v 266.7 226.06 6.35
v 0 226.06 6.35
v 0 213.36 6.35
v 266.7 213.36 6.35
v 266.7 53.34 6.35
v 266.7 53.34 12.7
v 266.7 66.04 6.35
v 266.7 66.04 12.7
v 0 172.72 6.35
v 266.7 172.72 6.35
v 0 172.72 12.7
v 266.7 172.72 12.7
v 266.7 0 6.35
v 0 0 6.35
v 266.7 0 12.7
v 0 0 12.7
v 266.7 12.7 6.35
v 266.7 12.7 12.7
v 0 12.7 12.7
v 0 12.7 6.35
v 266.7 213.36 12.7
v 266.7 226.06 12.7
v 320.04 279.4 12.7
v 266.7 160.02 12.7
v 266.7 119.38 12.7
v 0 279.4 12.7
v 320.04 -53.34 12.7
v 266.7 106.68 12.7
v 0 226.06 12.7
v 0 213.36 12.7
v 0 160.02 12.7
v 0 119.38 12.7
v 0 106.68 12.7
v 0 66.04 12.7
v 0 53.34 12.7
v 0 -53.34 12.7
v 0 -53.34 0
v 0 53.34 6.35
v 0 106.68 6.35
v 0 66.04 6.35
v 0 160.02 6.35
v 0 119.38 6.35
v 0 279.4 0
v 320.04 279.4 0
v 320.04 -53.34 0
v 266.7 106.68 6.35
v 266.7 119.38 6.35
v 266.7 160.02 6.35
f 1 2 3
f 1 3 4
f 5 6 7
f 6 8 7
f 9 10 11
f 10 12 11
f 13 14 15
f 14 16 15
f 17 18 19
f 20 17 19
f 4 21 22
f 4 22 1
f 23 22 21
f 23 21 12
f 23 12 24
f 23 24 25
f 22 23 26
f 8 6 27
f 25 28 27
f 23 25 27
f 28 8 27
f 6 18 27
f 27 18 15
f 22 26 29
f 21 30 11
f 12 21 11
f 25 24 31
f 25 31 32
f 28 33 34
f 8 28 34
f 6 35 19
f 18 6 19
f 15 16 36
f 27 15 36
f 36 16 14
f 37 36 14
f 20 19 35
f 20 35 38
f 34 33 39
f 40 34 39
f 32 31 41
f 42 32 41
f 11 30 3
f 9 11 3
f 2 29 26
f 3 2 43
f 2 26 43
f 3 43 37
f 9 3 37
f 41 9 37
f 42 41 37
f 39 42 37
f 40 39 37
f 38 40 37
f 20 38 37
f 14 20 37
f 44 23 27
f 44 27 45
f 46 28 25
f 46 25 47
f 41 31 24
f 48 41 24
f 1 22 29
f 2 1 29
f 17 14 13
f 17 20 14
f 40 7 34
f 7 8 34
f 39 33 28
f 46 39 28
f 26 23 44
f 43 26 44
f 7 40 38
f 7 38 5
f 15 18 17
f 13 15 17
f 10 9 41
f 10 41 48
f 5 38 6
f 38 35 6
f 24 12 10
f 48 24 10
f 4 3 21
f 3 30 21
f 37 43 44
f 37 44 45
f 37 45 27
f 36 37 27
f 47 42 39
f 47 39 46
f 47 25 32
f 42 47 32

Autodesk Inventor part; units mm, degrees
ref_plane "YZ Plane" through (0, 0, 0) normal (1, 0, 0) x (0, 1, 0)
ref_plane "XZ Plane" through (0, 0, 0) normal (0, 1, 0) x (-1, 0, 0)
ref_plane "XY Plane" through (0, 0, 0) normal (0, 0, 1) x (1, 0, 0)
sketch "Sketch1" plane through (0, 0, 0) normal (0, 0, 1) x (1, 0, 0)
  line L0 (0, 0) -> (279.4, 0)
  line L1 (279.4, 0) -> (279.4, 279.4)
  line L2 (279.4, 279.4) -> (0, 279.4)
  line L3 (0, 279.4) -> (0, 0)
  dimension "d0" = 279.4
  dimension "d1" = 279.4
extrude "Extrusion1" add sketch "Sketch1" along normal blind 12.7
sketch "Sketch2" plane through (0, 0, 12.7) normal (0, 0, 1) x (1, 0, 0)
  line L0 (279.4, 0) -> (279.4, 279.4) projected
  line L1 (0, 0) -> (279.4, 0)
  line L2 (279.4, 0) -> (279.4, 12.7)
  line L3 (279.4, 12.7) -> (0, 12.7)
  line L4 (0, 12.7) -> (0, 0)
  line L5 (0, 279.4) -> (0, 0) projected
  line L6 (0, 53.34) -> (279.4, 53.34)
  line L7 (279.4, 53.34) -> (279.4, 66.04)
  line L8 (279.4, 66.04) -> (0, 66.04)
  line L9 (0, 66.04) -> (0, 53.34)
  line L10 (0, 106.68) -> (279.4, 106.68)
  line L11 (279.4, 106.68) -> (279.4, 119.38)
  line L12 (279.4, 119.38) -> (0, 119.38)
  line L13 (0, 119.38) -> (0, 106.68)
  line L14 (0, 160.02) -> (279.4, 160.02)
  line L15 (279.4, 160.02) -> (279.4, 172.72)
  line L16 (279.4, 172.72) -> (0, 172.72)
  line L17 (0, 172.72) -> (0, 160.02)
  line L18 (0, 213.36) -> (279.4, 213.36)
  line L19 (279.4, 213.36) -> (279.4, 226.06)
  line L20 (279.4, 226.06) -> (0, 226.06)
  line L21 (0, 226.06) -> (0, 213.36)
  point P0 (0, 66.04)
  point P1 (0, 119.38)
  point P2 (0, 172.72)
  point P3 (0, 226.06)
  dimension "d4" = 12.7
  dimension "d5" = 12.7
  dimension "d6" = 40.64
  dimension "d7" = 12.7
  dimension "d8" = 40.64
  dimension "d9" = 12.7
  dimension "d10" = 40.64
  dimension "d11" = 12.7
  dimension "d12" = 40.64
extrude "Extrusion2" cut sketch "Sketch2" against normal blind 6.35 contours L1 L4 L3 L0 | L6 L5 L8 L0 | L10 L5 L12 L0 | L14 L5 L16 L0 | L18 L5 L20 L0
sketch "Sketch3" plane through (279.4, 0, 0) normal (1, 0, 0) x (0, 0, -1)
  point P0 (0, 0)
sketch "Sketch4" plane through (279.4, 0, 0) normal (1, 0, 0) x (0, 0, -1)
  line L0 (-6.35, 106.68) -> (-12.7, 106.68) projected
  line L1 (-12.7, 66.04) -> (-12.7, 106.68) projected
  line L2 (-12.7, 66.04) -> (-6.35, 66.04) projected
  line L3 (-6.35, 66.04) -> (-6.35, 53.34) projected
  line L4 (-6.35, 53.34) -> (-12.7, 53.34) projected
  line L5 (-12.7, 12.7) -> (-12.7, 53.34) projected
  line L6 (-12.7, 12.7) -> (-6.35, 12.7) projected
  line L7 (-6.35, 12.7) -> (-6.35, 0) projected
  line L8 (0, 0) -> (-6.35, 0) projected
  line L9 (0, 0) -> (0, 279.4) projected
  line L10 (0, 279.4) -> (-12.7, 279.4) projected
  line L11 (-12.7, 226.06) -> (-12.7, 279.4) projected
  line L12 (-12.7, 226.06) -> (-6.35, 226.06) projected
  line L13 (-6.35, 226.06) -> (-6.35, 213.36) projected
  line L14 (-6.35, 213.36) -> (-12.7, 213.36) projected
  line L15 (-12.7, 172.72) -> (-12.7, 213.36) projected
  line L16 (-12.7, 172.72) -> (-6.35, 172.72) projected
  line L17 (-6.35, 172.72) -> (-6.35, 160.02) projected
  line L18 (-6.35, 160.02) -> (-12.7, 160.02) projected
  line L19 (-12.7, 119.38) -> (-12.7, 160.02) projected
  line L20 (-12.7, 119.38) -> (-6.35, 119.38) projected
  line L21 (-6.35, 119.38) -> (-6.35, 106.68) projected
  point P0 (0, 0)
extrude "Extrusion3" cut sketch "Sketch4" against normal blind 12.7
sketch "Sketch5" plane through (0, 0, 0) normal (0, -1, 0) x (1, 0, 0)
  line L0 (0, 0) -> (266.7, 0) projected
  line L1 (266.7, 12.7) -> (0, 12.7) projected
  line L2 (0, 0) -> (266.7, 0)
  line L3 (266.7, 0) -> (266.7, 12.7)
  line L4 (266.7, 12.7) -> (0, 12.7)
  line L5 (0, 12.7) -> (0, 0)
extrude "Extrusion4" add sketch "Sketch5" along normal blind 53.34
sketch "Sketch6" plane through (266.7, 0, 0) normal (1, 0, 0) x (0, 0, -1)
  line L0 (0, 279.4) -> (0, -53.34) projected
  line L1 (-12.7, 279.4) -> (-12.7, 226.06) projected
  line L2 (0, -53.34) -> (-12.7, -53.34)
  line L3 (-12.7, -53.34) -> (-12.7, 279.4)
  line L4 (-12.7, 279.4) -> (0, 279.4)
  line L5 (0, 279.4) -> (0, -53.34)
  point P0 (0, 0)
extrude "Extrusion5" add sketch "Sketch6" along normal blind 53.34
properties part number "FrntBck Plate"
